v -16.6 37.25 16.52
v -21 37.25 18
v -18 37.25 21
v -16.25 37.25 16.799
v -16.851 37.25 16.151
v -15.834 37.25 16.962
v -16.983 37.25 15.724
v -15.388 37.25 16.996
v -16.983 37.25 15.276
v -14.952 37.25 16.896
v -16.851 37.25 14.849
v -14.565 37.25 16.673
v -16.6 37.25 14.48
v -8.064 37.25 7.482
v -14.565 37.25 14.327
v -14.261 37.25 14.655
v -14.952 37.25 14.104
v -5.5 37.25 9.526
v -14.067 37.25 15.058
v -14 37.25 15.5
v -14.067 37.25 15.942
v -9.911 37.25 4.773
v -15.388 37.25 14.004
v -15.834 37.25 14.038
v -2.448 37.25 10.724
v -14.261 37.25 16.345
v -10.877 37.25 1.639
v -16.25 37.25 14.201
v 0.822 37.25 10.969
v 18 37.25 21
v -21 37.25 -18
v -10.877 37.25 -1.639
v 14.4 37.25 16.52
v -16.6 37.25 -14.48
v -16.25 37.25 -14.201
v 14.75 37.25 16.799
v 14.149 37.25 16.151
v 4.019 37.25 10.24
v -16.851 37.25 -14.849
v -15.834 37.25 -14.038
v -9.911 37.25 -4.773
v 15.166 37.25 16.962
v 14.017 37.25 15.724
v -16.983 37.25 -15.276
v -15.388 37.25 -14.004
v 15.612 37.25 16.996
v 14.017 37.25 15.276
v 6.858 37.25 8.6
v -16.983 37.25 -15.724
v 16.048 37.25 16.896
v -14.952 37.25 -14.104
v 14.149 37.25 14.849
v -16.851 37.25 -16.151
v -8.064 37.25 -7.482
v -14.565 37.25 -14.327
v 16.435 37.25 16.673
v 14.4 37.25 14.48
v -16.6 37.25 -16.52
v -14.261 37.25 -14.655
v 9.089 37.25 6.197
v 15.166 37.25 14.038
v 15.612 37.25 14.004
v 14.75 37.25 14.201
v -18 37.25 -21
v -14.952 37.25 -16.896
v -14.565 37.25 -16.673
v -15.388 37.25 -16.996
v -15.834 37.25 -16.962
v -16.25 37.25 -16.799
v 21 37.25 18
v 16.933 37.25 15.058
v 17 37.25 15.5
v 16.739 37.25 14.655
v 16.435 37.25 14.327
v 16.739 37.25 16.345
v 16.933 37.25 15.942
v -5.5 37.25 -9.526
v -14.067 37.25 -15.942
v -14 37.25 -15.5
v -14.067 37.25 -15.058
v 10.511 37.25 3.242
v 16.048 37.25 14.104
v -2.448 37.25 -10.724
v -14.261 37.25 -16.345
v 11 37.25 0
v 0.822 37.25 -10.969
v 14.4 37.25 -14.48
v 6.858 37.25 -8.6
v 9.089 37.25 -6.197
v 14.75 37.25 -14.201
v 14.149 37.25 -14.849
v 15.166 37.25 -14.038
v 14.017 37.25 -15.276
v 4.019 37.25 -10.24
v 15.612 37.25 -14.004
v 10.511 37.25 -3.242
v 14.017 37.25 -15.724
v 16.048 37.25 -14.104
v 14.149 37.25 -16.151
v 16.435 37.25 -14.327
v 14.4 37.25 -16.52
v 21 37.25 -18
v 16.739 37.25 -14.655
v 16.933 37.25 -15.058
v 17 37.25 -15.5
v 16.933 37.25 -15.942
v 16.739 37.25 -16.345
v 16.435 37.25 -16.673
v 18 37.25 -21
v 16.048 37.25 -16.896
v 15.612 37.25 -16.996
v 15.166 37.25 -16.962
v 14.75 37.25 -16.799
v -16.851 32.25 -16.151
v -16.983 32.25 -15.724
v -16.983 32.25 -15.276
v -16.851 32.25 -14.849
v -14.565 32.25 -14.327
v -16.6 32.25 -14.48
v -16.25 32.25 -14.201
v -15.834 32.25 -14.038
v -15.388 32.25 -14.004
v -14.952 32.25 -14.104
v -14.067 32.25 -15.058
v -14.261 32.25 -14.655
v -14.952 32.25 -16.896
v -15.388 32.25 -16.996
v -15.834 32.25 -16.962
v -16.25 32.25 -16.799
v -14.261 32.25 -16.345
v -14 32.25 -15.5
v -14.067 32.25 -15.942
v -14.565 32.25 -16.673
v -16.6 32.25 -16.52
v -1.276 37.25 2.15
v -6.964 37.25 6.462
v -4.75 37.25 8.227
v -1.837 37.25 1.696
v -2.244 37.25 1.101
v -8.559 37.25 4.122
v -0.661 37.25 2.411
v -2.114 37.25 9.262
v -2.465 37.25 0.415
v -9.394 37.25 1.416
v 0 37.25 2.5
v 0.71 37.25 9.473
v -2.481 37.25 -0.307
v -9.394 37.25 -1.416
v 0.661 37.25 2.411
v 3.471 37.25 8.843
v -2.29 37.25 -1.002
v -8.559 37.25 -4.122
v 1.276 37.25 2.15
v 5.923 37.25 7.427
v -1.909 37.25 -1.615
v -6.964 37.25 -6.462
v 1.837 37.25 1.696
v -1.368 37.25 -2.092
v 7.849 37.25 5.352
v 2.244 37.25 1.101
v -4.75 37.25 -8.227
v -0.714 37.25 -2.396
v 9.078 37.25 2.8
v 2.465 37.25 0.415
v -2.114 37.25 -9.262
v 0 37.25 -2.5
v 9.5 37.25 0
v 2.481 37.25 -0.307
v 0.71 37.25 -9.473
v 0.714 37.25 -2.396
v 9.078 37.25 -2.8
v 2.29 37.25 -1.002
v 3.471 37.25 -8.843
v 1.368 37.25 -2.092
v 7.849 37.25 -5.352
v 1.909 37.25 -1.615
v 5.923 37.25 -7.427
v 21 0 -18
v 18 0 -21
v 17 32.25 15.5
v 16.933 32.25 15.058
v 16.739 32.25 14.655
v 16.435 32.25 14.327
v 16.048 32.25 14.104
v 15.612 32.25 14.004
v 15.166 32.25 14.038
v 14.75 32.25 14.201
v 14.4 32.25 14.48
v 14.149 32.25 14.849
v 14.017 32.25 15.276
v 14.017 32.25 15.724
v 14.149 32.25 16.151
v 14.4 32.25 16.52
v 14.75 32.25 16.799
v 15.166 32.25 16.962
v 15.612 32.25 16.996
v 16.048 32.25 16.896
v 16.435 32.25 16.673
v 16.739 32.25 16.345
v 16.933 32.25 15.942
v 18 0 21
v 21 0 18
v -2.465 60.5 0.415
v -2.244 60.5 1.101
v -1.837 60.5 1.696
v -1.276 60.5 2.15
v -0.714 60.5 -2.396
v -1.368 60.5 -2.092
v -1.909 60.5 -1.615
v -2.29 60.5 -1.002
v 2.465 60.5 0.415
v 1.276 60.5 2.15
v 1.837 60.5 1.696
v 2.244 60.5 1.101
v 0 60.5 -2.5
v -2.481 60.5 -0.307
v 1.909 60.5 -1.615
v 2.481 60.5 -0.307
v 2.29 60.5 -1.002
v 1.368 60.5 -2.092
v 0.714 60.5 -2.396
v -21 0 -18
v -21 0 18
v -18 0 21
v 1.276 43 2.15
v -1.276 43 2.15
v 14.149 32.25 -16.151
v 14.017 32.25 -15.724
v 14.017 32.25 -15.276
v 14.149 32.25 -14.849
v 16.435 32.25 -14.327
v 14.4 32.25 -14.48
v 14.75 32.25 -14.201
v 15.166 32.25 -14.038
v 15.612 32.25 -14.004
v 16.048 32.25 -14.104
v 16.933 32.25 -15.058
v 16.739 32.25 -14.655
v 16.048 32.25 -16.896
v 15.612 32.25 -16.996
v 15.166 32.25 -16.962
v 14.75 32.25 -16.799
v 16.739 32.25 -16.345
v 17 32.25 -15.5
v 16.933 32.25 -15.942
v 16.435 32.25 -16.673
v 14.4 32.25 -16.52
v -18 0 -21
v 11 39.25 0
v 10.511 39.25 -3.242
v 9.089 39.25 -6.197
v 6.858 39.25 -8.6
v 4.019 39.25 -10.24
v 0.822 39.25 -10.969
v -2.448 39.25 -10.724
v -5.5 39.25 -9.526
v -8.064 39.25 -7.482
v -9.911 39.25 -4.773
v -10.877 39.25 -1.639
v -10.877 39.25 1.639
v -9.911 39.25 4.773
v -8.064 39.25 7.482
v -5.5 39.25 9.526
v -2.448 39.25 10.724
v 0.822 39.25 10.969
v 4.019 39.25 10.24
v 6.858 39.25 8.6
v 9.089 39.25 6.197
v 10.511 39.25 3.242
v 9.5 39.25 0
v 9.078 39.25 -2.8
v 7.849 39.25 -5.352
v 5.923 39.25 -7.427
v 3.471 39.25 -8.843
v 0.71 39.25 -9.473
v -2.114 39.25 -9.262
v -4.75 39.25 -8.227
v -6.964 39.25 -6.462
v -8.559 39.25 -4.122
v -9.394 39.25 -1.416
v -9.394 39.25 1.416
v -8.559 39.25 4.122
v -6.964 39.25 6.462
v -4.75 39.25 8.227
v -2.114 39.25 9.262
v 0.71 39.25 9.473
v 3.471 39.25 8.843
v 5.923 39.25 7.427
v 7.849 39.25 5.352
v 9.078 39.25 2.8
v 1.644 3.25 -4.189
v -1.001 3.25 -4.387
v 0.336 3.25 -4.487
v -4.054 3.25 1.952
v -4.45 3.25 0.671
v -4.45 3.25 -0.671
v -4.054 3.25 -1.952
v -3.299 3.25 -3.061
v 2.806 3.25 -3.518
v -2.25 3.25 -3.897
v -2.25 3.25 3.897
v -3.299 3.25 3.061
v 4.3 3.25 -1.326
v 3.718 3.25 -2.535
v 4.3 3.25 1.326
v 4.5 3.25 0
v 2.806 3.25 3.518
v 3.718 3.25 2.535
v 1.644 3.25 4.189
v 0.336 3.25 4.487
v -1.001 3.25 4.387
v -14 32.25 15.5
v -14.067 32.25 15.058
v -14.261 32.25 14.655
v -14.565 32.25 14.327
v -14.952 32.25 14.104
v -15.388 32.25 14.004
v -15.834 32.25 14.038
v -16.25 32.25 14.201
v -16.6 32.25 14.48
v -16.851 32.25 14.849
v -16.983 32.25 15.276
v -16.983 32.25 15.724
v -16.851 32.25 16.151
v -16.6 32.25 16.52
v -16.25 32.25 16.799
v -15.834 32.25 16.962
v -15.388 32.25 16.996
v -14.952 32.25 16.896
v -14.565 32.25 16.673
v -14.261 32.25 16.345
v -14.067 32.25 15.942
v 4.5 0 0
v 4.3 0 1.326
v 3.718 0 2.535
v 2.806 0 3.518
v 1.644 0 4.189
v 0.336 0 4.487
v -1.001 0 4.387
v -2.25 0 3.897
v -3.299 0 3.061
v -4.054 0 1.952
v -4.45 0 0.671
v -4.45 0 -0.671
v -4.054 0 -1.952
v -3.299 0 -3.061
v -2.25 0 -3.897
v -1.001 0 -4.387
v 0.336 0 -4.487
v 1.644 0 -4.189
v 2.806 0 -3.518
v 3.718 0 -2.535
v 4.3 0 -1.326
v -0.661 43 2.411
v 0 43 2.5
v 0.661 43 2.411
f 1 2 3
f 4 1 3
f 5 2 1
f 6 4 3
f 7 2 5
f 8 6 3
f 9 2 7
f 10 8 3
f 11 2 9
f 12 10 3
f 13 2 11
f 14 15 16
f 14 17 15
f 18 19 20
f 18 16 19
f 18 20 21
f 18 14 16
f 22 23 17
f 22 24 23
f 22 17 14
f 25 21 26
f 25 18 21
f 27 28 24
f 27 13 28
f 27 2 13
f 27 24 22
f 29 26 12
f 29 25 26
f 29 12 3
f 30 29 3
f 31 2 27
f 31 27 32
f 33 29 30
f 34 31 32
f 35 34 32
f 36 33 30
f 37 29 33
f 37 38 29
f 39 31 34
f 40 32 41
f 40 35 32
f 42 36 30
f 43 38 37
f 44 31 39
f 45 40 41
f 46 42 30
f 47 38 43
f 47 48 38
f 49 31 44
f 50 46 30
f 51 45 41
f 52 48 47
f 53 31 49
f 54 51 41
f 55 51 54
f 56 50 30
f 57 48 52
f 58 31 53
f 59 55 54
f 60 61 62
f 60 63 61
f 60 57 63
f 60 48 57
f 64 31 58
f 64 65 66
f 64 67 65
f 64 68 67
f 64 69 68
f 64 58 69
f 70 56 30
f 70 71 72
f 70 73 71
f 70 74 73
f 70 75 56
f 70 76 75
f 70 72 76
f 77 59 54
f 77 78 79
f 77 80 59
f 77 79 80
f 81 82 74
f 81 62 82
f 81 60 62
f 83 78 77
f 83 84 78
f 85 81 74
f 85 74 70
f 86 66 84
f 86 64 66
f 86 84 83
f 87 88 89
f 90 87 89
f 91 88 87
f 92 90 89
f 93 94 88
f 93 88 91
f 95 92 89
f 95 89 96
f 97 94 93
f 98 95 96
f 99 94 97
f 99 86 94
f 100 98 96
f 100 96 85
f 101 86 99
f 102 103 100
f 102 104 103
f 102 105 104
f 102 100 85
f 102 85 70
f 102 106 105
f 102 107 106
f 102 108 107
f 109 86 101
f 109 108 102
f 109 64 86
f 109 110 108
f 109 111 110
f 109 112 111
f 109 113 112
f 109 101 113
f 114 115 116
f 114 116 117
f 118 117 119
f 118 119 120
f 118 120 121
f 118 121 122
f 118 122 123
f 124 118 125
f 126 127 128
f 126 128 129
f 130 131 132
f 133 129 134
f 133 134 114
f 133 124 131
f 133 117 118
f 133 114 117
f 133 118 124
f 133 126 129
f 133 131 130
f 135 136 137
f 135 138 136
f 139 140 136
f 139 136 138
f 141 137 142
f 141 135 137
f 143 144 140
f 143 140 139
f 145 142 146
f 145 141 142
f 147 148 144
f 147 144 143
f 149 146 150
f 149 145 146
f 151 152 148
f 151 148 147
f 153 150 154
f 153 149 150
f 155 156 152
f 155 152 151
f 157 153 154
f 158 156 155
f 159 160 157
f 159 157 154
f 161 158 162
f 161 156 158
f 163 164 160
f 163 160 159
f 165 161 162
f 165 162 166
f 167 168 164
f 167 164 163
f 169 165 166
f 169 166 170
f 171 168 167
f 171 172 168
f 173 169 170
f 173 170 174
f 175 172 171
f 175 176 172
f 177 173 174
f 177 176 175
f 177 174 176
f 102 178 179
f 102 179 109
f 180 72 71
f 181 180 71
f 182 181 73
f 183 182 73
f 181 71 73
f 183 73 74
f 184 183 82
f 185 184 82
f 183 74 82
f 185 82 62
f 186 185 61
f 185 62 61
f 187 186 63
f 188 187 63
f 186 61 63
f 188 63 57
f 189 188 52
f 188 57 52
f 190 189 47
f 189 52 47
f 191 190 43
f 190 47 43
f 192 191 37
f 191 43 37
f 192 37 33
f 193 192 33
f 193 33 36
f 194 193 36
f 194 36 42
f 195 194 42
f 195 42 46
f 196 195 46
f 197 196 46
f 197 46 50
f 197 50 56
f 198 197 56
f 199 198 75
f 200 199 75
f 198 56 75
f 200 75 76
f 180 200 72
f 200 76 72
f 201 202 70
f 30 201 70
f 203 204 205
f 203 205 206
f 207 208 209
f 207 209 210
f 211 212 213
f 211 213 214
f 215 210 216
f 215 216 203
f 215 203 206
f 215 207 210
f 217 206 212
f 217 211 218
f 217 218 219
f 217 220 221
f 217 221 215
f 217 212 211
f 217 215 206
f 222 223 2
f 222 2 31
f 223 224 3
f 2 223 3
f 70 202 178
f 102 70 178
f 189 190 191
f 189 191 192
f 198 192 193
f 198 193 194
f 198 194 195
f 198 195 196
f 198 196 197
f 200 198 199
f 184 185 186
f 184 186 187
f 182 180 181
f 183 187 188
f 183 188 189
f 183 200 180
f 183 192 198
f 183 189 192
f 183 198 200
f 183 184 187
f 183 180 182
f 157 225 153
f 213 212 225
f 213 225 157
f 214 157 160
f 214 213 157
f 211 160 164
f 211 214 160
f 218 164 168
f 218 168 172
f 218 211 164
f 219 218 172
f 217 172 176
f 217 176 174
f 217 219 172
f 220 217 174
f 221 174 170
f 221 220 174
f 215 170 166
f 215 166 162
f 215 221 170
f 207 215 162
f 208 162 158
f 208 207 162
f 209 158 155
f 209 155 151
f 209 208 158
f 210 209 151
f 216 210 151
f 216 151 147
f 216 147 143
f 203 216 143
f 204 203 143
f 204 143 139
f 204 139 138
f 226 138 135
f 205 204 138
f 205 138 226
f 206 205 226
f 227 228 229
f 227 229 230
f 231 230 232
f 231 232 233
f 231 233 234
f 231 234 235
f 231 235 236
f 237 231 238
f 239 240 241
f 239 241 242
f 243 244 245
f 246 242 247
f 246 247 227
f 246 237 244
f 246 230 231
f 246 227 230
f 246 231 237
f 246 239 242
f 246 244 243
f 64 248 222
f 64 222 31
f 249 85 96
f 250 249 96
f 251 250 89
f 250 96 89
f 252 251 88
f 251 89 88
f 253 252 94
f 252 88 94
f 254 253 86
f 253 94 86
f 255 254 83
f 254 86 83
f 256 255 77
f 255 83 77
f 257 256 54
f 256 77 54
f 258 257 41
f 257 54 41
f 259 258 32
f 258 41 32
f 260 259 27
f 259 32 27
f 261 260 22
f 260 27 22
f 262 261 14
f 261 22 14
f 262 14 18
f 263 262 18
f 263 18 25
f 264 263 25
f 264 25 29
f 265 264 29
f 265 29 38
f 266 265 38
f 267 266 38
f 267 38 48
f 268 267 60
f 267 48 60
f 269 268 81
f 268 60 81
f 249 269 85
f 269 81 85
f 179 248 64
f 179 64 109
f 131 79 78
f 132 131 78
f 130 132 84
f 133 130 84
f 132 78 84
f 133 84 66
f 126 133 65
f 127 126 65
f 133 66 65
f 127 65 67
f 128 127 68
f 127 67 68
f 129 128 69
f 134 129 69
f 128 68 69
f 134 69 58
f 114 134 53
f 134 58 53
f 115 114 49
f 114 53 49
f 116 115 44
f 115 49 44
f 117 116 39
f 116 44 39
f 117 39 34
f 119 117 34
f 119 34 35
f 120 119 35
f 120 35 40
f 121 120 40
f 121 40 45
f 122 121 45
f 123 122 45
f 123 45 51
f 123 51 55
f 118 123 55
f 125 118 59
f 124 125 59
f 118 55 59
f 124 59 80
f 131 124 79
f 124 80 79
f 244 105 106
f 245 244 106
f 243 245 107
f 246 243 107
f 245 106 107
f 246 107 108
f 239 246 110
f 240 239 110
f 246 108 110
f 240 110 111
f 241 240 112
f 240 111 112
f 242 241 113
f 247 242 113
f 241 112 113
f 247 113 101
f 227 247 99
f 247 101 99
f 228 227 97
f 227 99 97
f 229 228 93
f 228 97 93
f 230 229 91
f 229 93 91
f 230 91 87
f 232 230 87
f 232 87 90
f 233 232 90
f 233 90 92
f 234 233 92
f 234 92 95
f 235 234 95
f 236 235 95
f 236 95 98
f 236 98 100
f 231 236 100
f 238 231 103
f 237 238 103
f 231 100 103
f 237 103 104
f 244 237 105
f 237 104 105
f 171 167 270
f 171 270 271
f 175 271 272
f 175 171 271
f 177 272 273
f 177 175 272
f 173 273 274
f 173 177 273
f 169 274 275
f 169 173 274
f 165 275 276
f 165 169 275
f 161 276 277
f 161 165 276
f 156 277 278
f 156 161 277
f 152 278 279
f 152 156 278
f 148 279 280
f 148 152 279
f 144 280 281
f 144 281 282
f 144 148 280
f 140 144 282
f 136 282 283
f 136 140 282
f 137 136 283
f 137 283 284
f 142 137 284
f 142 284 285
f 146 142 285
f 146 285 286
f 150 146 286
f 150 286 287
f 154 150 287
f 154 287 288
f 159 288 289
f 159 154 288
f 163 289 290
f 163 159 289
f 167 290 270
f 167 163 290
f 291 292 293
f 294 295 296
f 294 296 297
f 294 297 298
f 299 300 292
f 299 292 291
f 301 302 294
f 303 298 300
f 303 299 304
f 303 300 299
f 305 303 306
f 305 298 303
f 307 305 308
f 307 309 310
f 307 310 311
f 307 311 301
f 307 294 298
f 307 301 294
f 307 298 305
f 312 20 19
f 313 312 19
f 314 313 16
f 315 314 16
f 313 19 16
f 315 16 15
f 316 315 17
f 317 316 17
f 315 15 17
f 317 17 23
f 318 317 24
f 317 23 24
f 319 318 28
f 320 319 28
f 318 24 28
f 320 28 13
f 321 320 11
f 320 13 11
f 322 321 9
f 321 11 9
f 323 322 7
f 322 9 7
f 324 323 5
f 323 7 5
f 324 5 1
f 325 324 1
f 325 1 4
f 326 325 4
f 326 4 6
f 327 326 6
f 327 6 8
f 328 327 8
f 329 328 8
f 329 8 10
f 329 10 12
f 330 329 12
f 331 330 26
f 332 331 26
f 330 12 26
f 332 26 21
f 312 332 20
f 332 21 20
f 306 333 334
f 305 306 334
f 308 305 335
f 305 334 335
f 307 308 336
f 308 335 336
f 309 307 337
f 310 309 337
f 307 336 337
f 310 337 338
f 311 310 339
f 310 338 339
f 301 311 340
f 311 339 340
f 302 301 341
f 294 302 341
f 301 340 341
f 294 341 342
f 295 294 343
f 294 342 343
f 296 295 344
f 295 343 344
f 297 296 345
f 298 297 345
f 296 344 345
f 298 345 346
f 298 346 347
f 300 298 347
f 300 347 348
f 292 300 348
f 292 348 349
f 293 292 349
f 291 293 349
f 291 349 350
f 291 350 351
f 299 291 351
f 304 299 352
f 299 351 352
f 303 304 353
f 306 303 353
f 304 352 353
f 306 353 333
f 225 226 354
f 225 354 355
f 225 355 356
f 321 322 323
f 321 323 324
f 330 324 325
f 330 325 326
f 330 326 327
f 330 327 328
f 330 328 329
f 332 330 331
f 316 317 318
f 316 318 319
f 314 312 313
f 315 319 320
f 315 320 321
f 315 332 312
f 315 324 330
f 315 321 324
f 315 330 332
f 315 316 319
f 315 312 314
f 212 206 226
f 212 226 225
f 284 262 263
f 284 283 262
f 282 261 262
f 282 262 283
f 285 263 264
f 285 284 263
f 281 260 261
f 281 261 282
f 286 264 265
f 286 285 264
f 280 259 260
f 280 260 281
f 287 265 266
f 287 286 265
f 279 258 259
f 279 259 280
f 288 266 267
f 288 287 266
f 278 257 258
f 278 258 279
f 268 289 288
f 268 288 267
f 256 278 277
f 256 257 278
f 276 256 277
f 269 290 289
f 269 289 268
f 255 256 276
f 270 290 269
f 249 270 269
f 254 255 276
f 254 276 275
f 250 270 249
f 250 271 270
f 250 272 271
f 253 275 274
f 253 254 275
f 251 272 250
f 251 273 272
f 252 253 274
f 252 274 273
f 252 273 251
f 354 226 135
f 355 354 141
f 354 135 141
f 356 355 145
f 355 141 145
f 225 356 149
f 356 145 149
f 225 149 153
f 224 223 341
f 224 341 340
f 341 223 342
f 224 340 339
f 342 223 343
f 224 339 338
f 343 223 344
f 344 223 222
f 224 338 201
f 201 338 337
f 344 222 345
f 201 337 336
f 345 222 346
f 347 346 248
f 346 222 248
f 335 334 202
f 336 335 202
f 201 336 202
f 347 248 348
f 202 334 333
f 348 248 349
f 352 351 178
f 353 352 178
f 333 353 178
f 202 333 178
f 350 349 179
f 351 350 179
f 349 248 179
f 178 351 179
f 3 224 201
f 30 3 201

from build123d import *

# Parameters (mm, degrees)
SKETCH1_W           = 42
SKETCH1_H           = 42
BOSS_EXTRUDE1_DEPTH = 37.25
SKETCH2_R           = 1.5
CUT_EXTRUDE1_DEPTH  = 5
SKETCH3_R           = 11
SKETCH3_R_2         = 9.5
BOSS_EXTRUDE2_DEPTH = 2
BOSS_EXTRUDE3_DEPTH = 23.25
CHAMFER1_SIZE       = 3
SKETCH6_R           = 4.5
CUT_EXTRUDE2_DEPTH  = 3.25
SKETCH7_R           = 2.5
BOSS_EXTRUDE4_DEPTH = 5.75


with BuildPart() as part:
    # Sketch1 → Boss-Extrude1 (new body)
    with BuildSketch(Plane(origin=(0, 0, 0), x_dir=(1, 0, 0), z_dir=(0, 1, 0))):
        Rectangle(SKETCH1_W, SKETCH1_H)
    extrude(amount=BOSS_EXTRUDE1_DEPTH)

    # Sketch2 → Cut-Extrude1 (cut)
    with BuildSketch(Plane(origin=(0, 37.25, 0), x_dir=(1, 0, 0), z_dir=(0, 1, 0))):
        with Locations((15.5, 15.5)):
            Circle(SKETCH2_R)
        with Locations((15.5, -15.5)):
            Circle(SKETCH2_R)
        with Locations((-15.5, -15.5)):
            Circle(SKETCH2_R)
        with Locations((-15.5, 15.5)):
            Circle(SKETCH2_R)
    extrude(amount=-CUT_EXTRUDE1_DEPTH, mode=Mode.SUBTRACT)

    # Sketch3 → Boss-Extrude2 (add)
    with BuildSketch(Plane(origin=(0, 37.25, 0), x_dir=(1, 0, 0), z_dir=(0, 1, 0))):
        Circle(SKETCH3_R)
        Circle(SKETCH3_R_2, mode=Mode.SUBTRACT)
    extrude(amount=BOSS_EXTRUDE2_DEPTH)

    # Chamfer1
    chamfer1_edges = [part.edges().sort_by_distance(p)[0] for p in [
        (21, 18.625, 21),
        (-21, 18.625, 21),
        (-21, 18.625, -21),
        (21, 18.625, -21),
    ]]
    chamfer(chamfer1_edges, length=CHAMFER1_SIZE)

    # Sketch6 → Cut-Extrude2 (cut)
    with BuildSketch(Plane.XZ):
        Circle(SKETCH6_R)
    extrude(amount=-CUT_EXTRUDE2_DEPTH, mode=Mode.SUBTRACT)



with BuildPart() as body_2:
    # Sketch4 → Boss-Extrude3 (new body)
    with BuildSketch(Plane(origin=(0, 60.5, 0), x_dir=(1, 0, 0), z_dir=(0, 1, 0))):
        with BuildLine():
            Line((-1.275735082, -2.15), (1.275735082, -2.15))
            ThreePointArc((1.275735082, -2.15), (0, 2.5), (-1.275735082, -2.15))
        make_face()
    extrude(amount=-BOSS_EXTRUDE3_DEPTH)


with BuildPart() as part_1:
    add(part.part)

    add(body_2.part)  # Boss-Extrude4 merges body 2
    # Sketch7 → Boss-Extrude4 (add)
    with BuildSketch(Plane(origin=(0, 37.25, 0), x_dir=(1, 0, 0), z_dir=(0, 1, 0))):
        Circle(SKETCH7_R)
    extrude(amount=BOSS_EXTRUDE4_DEPTH)


solid = part_1.part
